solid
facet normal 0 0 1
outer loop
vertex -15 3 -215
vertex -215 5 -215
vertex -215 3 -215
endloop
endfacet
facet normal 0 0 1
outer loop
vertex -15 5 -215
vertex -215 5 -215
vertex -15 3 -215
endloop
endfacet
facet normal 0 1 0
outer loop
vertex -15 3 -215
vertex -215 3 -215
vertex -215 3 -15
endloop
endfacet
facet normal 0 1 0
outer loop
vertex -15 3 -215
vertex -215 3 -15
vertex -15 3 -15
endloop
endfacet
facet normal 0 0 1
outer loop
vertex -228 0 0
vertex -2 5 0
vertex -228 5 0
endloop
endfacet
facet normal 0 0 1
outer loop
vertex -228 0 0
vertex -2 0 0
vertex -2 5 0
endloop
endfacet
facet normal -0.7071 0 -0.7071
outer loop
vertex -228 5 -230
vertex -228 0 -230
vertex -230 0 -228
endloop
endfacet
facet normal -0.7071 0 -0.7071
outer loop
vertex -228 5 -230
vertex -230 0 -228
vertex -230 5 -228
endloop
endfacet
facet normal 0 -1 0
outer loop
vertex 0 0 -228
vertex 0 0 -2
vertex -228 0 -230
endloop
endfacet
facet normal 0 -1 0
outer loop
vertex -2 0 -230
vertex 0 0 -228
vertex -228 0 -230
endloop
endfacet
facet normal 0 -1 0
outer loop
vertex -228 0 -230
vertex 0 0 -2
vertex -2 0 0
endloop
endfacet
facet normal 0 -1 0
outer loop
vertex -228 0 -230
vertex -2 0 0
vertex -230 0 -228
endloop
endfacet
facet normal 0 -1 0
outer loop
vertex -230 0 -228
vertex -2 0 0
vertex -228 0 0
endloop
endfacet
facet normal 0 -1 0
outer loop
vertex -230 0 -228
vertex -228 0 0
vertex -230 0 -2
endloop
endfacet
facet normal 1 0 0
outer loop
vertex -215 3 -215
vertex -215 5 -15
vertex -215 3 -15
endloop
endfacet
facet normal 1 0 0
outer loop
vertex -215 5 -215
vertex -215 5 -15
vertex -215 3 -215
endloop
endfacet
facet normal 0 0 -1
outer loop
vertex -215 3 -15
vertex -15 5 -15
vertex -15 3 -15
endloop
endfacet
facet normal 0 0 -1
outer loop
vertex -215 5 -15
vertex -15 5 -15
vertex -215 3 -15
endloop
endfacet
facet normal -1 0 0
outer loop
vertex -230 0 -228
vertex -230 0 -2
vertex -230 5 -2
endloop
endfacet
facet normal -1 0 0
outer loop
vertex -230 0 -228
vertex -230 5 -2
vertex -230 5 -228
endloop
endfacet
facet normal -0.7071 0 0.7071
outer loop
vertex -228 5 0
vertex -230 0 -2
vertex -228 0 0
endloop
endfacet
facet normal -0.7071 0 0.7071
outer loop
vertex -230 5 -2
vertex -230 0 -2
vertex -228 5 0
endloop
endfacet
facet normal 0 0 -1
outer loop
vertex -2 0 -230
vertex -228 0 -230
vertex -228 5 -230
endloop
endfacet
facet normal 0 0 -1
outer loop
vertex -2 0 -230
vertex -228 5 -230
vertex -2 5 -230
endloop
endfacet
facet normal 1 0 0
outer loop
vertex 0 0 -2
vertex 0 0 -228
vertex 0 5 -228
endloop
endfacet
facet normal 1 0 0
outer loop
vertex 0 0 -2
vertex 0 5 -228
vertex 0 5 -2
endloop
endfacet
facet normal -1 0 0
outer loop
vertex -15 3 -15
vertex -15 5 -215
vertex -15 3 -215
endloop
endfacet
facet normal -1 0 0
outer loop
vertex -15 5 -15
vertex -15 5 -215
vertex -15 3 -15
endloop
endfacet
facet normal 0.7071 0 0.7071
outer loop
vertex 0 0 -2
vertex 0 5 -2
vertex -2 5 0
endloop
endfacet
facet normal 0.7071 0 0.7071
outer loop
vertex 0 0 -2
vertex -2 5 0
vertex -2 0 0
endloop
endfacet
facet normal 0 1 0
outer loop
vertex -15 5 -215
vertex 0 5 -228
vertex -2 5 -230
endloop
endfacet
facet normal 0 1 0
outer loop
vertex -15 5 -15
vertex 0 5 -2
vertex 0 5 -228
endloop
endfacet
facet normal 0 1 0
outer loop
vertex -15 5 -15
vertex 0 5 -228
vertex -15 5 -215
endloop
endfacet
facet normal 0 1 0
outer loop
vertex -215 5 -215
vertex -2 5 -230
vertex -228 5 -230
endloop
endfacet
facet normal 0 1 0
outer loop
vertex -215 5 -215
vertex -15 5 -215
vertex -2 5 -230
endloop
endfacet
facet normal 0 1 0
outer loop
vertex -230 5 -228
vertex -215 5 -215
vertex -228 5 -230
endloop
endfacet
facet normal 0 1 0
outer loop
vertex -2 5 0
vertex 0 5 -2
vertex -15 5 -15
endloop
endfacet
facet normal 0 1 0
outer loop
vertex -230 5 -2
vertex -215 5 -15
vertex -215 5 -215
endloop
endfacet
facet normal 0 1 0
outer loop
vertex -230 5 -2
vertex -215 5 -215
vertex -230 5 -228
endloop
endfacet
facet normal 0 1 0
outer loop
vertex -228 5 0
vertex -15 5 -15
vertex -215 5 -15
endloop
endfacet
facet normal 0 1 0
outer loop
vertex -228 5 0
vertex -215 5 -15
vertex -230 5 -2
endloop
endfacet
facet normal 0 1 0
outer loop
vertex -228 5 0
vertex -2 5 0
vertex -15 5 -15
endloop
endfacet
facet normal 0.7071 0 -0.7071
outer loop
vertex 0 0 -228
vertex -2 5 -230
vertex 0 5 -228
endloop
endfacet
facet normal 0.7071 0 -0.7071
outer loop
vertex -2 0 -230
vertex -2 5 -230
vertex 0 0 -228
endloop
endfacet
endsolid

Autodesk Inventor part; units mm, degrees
ref_plane "YZ Plane" through (0, 0, 0) normal (1, 0, 0) x (0, 1, 0)
ref_plane "XZ Plane" through (0, 0, 0) normal (0, 1, 0) x (-1, 0, 0)
ref_plane "XY Plane" through (0, 0, 0) normal (0, 0, 1) x (1, 0, 0)
sketch "Sketch1" plane through (0, 0, 0) normal (0, 1, 0) x (-1, 0, 0)
  line L0 (0, 0) -> (230, 0)
  line L1 (230, 0) -> (230, -230)
  line L2 (230, -230) -> (0, -230)
  line L3 (0, -230) -> (0, 0)
  dimension "d0" = 230
  dimension "d1" = 230
extrude "Extrusion1" add sketch "Sketch1" along normal blind 5
sketch "Sketch2" plane through (0, 5, 0) normal (0, 1, 0) x (1, 0, 0)
  line L0 (-215, 215) -> (-15, 215)
  line L1 (-15, 215) -> (-15, 15)
  line L2 (-15, 15) -> (-215, 15)
  line L3 (-215, 15) -> (-215, 215)
  line L4 (-230, 230) -> (-230, 0) projected
  point P0 (0, 0)
  dimension "d4" = 200
  dimension "d5" = 200
  dimension "d6" = 15
  dimension "d7" = 15
extrude "Extrusion2" cut sketch "Sketch2" against normal blind 2
chamfer "Chamfer1" distance 2 angle 45 4 edges at (-230, 2.5, 0) (-230, 2.5, -230) (0, 2.5, -230) (0, 2.5, 0)
properties part number "MouldBase20"
